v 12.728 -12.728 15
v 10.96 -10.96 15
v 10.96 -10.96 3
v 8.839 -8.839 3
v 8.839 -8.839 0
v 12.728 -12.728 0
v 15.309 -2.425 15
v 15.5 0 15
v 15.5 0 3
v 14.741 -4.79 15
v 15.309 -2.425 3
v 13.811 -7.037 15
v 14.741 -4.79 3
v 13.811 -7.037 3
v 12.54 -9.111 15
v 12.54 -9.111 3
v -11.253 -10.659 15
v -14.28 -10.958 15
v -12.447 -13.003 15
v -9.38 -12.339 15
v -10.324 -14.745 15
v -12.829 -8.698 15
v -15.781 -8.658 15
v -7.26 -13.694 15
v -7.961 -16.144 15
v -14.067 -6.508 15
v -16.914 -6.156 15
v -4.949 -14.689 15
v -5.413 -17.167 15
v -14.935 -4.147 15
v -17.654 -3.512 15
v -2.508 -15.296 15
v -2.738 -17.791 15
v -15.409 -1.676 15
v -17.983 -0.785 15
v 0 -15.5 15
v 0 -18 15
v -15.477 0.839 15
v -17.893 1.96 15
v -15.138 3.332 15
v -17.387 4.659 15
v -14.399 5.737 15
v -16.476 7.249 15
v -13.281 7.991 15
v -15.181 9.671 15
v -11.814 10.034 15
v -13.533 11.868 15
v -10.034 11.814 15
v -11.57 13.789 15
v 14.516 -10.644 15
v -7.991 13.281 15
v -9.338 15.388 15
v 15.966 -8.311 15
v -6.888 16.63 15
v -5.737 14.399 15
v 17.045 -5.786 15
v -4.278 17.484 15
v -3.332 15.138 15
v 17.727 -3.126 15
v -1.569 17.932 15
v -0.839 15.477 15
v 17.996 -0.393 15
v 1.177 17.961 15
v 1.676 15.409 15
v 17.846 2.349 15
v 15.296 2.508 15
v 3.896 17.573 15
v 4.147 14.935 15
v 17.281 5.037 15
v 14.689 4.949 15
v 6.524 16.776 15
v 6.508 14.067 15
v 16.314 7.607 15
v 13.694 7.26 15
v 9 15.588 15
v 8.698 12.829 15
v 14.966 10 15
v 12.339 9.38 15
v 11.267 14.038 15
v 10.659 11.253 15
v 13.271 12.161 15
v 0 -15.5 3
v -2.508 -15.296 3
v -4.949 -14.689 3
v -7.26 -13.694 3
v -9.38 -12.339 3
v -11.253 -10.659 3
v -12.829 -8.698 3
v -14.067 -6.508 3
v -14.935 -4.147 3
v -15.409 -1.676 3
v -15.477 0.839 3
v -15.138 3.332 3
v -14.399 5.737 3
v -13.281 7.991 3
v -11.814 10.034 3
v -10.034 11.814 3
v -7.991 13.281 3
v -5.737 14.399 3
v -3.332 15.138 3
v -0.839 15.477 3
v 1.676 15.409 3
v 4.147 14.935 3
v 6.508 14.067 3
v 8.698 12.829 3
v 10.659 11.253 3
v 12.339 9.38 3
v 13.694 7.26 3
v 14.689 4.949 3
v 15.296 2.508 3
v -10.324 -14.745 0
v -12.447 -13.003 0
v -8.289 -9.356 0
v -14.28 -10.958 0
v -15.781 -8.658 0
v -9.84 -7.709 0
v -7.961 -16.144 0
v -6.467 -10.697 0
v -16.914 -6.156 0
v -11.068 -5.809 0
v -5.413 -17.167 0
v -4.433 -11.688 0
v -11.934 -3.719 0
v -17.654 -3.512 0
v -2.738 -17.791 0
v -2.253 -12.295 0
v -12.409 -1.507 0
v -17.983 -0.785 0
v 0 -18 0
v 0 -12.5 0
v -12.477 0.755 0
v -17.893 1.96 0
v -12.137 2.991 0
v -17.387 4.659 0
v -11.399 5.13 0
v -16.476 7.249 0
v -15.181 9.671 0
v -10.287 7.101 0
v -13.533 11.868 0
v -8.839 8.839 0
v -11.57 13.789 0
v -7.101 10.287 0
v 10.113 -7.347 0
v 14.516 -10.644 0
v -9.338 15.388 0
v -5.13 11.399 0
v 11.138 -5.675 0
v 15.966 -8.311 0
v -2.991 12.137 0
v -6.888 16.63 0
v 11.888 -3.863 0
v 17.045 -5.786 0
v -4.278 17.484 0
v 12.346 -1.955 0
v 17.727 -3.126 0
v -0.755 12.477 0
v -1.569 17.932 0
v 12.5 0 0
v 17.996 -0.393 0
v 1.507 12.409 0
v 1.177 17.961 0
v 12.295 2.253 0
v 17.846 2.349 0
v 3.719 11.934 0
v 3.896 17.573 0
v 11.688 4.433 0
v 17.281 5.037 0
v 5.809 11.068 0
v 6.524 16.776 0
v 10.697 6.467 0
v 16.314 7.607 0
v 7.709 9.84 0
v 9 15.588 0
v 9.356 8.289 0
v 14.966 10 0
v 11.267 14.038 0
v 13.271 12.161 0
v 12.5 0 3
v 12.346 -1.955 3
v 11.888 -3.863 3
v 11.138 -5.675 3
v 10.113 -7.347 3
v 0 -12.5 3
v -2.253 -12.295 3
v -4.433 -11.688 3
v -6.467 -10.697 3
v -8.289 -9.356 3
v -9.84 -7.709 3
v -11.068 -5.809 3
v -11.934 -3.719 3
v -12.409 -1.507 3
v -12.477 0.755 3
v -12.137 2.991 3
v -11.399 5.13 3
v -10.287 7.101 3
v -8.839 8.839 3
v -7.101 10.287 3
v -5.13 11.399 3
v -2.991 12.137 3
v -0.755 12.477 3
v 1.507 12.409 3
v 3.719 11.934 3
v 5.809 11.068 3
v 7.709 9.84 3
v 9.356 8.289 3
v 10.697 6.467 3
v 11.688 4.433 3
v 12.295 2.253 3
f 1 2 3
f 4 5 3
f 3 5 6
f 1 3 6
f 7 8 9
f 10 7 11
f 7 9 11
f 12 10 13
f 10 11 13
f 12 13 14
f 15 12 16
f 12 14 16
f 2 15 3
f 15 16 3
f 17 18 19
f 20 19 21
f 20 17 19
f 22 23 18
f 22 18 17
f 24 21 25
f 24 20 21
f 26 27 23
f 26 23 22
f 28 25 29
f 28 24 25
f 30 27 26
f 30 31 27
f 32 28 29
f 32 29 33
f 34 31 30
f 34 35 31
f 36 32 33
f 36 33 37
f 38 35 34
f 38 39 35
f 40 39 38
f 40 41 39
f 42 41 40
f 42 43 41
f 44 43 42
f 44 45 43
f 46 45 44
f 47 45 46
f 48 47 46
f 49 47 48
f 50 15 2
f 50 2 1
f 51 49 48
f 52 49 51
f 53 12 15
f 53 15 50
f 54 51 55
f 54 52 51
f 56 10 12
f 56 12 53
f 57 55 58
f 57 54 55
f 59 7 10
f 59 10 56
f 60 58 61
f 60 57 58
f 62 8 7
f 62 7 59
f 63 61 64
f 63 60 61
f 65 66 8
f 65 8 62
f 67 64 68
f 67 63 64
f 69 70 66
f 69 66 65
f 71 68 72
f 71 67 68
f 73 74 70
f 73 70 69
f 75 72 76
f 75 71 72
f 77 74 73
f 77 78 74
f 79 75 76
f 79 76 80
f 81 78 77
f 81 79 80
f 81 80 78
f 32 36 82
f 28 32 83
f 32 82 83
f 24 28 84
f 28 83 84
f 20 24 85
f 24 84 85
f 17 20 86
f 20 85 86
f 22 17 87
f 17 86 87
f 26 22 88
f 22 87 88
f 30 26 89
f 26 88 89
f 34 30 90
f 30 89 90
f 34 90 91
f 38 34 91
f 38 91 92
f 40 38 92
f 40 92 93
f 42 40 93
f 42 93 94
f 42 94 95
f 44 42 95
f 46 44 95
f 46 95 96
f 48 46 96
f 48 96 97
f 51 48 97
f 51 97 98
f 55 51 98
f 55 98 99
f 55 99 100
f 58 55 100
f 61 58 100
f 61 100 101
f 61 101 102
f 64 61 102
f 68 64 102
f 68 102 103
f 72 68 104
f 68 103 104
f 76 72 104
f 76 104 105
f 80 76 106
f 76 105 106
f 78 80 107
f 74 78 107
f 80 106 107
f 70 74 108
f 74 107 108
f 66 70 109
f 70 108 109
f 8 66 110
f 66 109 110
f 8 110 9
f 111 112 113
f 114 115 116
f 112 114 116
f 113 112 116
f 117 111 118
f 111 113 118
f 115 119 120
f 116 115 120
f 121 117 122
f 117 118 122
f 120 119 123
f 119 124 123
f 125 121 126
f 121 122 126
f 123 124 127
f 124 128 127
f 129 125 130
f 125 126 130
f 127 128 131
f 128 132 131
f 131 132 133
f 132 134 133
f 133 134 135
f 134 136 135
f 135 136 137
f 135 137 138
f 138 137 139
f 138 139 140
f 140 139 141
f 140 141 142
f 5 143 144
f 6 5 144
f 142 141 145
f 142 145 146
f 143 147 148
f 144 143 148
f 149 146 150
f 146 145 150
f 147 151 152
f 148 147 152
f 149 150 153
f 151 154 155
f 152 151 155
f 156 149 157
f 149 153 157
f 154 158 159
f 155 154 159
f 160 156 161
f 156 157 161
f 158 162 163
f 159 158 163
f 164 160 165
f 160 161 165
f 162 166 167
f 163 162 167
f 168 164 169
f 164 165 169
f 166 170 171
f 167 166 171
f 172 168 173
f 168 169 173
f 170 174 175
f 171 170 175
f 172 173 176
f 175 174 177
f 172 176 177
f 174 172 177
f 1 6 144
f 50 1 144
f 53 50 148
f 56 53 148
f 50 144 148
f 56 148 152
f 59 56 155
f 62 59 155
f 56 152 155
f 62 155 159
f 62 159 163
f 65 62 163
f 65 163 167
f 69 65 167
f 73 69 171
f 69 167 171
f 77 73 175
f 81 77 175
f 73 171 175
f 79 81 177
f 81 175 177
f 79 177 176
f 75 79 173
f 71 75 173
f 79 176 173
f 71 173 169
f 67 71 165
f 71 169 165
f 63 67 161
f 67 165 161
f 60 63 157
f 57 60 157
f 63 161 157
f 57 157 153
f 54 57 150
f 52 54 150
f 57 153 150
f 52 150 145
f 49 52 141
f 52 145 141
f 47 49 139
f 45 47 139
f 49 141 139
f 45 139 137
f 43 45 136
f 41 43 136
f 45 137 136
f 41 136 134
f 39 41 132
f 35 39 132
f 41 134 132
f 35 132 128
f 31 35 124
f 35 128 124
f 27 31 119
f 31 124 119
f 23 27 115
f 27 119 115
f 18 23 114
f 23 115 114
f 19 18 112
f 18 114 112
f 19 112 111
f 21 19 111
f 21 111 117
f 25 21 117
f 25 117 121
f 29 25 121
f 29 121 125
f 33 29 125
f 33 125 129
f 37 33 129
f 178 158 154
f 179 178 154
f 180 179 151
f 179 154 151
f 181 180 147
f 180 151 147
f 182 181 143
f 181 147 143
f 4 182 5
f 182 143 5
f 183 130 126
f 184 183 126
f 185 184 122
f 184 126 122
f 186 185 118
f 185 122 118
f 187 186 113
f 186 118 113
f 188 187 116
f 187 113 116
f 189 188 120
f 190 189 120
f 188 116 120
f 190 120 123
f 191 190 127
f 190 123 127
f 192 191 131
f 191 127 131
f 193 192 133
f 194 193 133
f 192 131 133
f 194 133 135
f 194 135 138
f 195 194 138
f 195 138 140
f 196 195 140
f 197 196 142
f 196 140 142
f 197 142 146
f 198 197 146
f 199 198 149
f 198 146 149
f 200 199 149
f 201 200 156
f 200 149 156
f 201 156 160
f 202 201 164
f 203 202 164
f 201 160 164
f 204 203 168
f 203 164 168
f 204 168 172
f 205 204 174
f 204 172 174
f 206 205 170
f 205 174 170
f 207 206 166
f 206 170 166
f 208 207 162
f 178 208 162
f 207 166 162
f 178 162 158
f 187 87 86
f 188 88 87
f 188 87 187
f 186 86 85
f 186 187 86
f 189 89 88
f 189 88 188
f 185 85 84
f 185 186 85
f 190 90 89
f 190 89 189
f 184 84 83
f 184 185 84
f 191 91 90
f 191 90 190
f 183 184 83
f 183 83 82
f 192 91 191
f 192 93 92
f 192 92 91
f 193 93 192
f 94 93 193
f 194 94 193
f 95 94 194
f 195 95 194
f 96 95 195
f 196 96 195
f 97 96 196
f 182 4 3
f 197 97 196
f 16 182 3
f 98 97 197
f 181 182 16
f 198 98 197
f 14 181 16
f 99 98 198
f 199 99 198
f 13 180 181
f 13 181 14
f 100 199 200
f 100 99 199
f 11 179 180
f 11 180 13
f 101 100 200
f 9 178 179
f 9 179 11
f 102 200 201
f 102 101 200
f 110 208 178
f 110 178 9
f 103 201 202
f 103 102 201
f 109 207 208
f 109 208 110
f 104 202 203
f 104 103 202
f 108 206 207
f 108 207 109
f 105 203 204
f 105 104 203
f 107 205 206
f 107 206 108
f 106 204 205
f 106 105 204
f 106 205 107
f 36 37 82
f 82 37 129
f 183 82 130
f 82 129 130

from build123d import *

# Parameters (mm, degrees)
F1_DEPTH = 3
F2_DEPTH = 15


with BuildPart() as f1:
    # F0 (on Top) → F1 (new body)
    with BuildSketch(Plane.XY):
        with BuildLine():
            ThreePointArc((0, -12.5), (-8.8388347648, 8.8388347648), (12.5, 0))
            ThreePointArc((12.5, 0), (11.5484941564, -4.7835429046), (8.8388347648, -8.8388347648))
            Line((8.8388347648, -8.8388347648), (10.9601551084, -10.9601551084))
            ThreePointArc((10.9601551084, -10.9601551084), (14.3201327539, -5.9315932017), (15.5, 0))
            ThreePointArc((15.5, 0), (-10.9601551084, 10.9601551084), (0, -15.5))
            Line((0, -15.5), (0, -12.5))
        make_face()
    extrude(amount=F1_DEPTH)

    # F0 (on Top) → F2 (join)
    with BuildSketch(Plane.XY):
        with BuildLine():
            Line((0, -18), (0, -15.5))
            ThreePointArc((0, -15.5), (-10.9601551084, 10.9601551084), (15.5, 0))
            ThreePointArc((15.5, 0), (14.3201327539, -5.9315932017), (10.9601551084, -10.9601551084))
            Line((10.9601551084, -10.9601551084), (12.7279220614, -12.7279220614))
            ThreePointArc((12.7279220614, -12.7279220614), (16.6298315852, -6.8883017826), (18, 0))
            ThreePointArc((18, 0), (-12.7279220614, 12.7279220614), (0, -18))
        make_face()
    extrude(amount=F2_DEPTH)


solid = f1.part
